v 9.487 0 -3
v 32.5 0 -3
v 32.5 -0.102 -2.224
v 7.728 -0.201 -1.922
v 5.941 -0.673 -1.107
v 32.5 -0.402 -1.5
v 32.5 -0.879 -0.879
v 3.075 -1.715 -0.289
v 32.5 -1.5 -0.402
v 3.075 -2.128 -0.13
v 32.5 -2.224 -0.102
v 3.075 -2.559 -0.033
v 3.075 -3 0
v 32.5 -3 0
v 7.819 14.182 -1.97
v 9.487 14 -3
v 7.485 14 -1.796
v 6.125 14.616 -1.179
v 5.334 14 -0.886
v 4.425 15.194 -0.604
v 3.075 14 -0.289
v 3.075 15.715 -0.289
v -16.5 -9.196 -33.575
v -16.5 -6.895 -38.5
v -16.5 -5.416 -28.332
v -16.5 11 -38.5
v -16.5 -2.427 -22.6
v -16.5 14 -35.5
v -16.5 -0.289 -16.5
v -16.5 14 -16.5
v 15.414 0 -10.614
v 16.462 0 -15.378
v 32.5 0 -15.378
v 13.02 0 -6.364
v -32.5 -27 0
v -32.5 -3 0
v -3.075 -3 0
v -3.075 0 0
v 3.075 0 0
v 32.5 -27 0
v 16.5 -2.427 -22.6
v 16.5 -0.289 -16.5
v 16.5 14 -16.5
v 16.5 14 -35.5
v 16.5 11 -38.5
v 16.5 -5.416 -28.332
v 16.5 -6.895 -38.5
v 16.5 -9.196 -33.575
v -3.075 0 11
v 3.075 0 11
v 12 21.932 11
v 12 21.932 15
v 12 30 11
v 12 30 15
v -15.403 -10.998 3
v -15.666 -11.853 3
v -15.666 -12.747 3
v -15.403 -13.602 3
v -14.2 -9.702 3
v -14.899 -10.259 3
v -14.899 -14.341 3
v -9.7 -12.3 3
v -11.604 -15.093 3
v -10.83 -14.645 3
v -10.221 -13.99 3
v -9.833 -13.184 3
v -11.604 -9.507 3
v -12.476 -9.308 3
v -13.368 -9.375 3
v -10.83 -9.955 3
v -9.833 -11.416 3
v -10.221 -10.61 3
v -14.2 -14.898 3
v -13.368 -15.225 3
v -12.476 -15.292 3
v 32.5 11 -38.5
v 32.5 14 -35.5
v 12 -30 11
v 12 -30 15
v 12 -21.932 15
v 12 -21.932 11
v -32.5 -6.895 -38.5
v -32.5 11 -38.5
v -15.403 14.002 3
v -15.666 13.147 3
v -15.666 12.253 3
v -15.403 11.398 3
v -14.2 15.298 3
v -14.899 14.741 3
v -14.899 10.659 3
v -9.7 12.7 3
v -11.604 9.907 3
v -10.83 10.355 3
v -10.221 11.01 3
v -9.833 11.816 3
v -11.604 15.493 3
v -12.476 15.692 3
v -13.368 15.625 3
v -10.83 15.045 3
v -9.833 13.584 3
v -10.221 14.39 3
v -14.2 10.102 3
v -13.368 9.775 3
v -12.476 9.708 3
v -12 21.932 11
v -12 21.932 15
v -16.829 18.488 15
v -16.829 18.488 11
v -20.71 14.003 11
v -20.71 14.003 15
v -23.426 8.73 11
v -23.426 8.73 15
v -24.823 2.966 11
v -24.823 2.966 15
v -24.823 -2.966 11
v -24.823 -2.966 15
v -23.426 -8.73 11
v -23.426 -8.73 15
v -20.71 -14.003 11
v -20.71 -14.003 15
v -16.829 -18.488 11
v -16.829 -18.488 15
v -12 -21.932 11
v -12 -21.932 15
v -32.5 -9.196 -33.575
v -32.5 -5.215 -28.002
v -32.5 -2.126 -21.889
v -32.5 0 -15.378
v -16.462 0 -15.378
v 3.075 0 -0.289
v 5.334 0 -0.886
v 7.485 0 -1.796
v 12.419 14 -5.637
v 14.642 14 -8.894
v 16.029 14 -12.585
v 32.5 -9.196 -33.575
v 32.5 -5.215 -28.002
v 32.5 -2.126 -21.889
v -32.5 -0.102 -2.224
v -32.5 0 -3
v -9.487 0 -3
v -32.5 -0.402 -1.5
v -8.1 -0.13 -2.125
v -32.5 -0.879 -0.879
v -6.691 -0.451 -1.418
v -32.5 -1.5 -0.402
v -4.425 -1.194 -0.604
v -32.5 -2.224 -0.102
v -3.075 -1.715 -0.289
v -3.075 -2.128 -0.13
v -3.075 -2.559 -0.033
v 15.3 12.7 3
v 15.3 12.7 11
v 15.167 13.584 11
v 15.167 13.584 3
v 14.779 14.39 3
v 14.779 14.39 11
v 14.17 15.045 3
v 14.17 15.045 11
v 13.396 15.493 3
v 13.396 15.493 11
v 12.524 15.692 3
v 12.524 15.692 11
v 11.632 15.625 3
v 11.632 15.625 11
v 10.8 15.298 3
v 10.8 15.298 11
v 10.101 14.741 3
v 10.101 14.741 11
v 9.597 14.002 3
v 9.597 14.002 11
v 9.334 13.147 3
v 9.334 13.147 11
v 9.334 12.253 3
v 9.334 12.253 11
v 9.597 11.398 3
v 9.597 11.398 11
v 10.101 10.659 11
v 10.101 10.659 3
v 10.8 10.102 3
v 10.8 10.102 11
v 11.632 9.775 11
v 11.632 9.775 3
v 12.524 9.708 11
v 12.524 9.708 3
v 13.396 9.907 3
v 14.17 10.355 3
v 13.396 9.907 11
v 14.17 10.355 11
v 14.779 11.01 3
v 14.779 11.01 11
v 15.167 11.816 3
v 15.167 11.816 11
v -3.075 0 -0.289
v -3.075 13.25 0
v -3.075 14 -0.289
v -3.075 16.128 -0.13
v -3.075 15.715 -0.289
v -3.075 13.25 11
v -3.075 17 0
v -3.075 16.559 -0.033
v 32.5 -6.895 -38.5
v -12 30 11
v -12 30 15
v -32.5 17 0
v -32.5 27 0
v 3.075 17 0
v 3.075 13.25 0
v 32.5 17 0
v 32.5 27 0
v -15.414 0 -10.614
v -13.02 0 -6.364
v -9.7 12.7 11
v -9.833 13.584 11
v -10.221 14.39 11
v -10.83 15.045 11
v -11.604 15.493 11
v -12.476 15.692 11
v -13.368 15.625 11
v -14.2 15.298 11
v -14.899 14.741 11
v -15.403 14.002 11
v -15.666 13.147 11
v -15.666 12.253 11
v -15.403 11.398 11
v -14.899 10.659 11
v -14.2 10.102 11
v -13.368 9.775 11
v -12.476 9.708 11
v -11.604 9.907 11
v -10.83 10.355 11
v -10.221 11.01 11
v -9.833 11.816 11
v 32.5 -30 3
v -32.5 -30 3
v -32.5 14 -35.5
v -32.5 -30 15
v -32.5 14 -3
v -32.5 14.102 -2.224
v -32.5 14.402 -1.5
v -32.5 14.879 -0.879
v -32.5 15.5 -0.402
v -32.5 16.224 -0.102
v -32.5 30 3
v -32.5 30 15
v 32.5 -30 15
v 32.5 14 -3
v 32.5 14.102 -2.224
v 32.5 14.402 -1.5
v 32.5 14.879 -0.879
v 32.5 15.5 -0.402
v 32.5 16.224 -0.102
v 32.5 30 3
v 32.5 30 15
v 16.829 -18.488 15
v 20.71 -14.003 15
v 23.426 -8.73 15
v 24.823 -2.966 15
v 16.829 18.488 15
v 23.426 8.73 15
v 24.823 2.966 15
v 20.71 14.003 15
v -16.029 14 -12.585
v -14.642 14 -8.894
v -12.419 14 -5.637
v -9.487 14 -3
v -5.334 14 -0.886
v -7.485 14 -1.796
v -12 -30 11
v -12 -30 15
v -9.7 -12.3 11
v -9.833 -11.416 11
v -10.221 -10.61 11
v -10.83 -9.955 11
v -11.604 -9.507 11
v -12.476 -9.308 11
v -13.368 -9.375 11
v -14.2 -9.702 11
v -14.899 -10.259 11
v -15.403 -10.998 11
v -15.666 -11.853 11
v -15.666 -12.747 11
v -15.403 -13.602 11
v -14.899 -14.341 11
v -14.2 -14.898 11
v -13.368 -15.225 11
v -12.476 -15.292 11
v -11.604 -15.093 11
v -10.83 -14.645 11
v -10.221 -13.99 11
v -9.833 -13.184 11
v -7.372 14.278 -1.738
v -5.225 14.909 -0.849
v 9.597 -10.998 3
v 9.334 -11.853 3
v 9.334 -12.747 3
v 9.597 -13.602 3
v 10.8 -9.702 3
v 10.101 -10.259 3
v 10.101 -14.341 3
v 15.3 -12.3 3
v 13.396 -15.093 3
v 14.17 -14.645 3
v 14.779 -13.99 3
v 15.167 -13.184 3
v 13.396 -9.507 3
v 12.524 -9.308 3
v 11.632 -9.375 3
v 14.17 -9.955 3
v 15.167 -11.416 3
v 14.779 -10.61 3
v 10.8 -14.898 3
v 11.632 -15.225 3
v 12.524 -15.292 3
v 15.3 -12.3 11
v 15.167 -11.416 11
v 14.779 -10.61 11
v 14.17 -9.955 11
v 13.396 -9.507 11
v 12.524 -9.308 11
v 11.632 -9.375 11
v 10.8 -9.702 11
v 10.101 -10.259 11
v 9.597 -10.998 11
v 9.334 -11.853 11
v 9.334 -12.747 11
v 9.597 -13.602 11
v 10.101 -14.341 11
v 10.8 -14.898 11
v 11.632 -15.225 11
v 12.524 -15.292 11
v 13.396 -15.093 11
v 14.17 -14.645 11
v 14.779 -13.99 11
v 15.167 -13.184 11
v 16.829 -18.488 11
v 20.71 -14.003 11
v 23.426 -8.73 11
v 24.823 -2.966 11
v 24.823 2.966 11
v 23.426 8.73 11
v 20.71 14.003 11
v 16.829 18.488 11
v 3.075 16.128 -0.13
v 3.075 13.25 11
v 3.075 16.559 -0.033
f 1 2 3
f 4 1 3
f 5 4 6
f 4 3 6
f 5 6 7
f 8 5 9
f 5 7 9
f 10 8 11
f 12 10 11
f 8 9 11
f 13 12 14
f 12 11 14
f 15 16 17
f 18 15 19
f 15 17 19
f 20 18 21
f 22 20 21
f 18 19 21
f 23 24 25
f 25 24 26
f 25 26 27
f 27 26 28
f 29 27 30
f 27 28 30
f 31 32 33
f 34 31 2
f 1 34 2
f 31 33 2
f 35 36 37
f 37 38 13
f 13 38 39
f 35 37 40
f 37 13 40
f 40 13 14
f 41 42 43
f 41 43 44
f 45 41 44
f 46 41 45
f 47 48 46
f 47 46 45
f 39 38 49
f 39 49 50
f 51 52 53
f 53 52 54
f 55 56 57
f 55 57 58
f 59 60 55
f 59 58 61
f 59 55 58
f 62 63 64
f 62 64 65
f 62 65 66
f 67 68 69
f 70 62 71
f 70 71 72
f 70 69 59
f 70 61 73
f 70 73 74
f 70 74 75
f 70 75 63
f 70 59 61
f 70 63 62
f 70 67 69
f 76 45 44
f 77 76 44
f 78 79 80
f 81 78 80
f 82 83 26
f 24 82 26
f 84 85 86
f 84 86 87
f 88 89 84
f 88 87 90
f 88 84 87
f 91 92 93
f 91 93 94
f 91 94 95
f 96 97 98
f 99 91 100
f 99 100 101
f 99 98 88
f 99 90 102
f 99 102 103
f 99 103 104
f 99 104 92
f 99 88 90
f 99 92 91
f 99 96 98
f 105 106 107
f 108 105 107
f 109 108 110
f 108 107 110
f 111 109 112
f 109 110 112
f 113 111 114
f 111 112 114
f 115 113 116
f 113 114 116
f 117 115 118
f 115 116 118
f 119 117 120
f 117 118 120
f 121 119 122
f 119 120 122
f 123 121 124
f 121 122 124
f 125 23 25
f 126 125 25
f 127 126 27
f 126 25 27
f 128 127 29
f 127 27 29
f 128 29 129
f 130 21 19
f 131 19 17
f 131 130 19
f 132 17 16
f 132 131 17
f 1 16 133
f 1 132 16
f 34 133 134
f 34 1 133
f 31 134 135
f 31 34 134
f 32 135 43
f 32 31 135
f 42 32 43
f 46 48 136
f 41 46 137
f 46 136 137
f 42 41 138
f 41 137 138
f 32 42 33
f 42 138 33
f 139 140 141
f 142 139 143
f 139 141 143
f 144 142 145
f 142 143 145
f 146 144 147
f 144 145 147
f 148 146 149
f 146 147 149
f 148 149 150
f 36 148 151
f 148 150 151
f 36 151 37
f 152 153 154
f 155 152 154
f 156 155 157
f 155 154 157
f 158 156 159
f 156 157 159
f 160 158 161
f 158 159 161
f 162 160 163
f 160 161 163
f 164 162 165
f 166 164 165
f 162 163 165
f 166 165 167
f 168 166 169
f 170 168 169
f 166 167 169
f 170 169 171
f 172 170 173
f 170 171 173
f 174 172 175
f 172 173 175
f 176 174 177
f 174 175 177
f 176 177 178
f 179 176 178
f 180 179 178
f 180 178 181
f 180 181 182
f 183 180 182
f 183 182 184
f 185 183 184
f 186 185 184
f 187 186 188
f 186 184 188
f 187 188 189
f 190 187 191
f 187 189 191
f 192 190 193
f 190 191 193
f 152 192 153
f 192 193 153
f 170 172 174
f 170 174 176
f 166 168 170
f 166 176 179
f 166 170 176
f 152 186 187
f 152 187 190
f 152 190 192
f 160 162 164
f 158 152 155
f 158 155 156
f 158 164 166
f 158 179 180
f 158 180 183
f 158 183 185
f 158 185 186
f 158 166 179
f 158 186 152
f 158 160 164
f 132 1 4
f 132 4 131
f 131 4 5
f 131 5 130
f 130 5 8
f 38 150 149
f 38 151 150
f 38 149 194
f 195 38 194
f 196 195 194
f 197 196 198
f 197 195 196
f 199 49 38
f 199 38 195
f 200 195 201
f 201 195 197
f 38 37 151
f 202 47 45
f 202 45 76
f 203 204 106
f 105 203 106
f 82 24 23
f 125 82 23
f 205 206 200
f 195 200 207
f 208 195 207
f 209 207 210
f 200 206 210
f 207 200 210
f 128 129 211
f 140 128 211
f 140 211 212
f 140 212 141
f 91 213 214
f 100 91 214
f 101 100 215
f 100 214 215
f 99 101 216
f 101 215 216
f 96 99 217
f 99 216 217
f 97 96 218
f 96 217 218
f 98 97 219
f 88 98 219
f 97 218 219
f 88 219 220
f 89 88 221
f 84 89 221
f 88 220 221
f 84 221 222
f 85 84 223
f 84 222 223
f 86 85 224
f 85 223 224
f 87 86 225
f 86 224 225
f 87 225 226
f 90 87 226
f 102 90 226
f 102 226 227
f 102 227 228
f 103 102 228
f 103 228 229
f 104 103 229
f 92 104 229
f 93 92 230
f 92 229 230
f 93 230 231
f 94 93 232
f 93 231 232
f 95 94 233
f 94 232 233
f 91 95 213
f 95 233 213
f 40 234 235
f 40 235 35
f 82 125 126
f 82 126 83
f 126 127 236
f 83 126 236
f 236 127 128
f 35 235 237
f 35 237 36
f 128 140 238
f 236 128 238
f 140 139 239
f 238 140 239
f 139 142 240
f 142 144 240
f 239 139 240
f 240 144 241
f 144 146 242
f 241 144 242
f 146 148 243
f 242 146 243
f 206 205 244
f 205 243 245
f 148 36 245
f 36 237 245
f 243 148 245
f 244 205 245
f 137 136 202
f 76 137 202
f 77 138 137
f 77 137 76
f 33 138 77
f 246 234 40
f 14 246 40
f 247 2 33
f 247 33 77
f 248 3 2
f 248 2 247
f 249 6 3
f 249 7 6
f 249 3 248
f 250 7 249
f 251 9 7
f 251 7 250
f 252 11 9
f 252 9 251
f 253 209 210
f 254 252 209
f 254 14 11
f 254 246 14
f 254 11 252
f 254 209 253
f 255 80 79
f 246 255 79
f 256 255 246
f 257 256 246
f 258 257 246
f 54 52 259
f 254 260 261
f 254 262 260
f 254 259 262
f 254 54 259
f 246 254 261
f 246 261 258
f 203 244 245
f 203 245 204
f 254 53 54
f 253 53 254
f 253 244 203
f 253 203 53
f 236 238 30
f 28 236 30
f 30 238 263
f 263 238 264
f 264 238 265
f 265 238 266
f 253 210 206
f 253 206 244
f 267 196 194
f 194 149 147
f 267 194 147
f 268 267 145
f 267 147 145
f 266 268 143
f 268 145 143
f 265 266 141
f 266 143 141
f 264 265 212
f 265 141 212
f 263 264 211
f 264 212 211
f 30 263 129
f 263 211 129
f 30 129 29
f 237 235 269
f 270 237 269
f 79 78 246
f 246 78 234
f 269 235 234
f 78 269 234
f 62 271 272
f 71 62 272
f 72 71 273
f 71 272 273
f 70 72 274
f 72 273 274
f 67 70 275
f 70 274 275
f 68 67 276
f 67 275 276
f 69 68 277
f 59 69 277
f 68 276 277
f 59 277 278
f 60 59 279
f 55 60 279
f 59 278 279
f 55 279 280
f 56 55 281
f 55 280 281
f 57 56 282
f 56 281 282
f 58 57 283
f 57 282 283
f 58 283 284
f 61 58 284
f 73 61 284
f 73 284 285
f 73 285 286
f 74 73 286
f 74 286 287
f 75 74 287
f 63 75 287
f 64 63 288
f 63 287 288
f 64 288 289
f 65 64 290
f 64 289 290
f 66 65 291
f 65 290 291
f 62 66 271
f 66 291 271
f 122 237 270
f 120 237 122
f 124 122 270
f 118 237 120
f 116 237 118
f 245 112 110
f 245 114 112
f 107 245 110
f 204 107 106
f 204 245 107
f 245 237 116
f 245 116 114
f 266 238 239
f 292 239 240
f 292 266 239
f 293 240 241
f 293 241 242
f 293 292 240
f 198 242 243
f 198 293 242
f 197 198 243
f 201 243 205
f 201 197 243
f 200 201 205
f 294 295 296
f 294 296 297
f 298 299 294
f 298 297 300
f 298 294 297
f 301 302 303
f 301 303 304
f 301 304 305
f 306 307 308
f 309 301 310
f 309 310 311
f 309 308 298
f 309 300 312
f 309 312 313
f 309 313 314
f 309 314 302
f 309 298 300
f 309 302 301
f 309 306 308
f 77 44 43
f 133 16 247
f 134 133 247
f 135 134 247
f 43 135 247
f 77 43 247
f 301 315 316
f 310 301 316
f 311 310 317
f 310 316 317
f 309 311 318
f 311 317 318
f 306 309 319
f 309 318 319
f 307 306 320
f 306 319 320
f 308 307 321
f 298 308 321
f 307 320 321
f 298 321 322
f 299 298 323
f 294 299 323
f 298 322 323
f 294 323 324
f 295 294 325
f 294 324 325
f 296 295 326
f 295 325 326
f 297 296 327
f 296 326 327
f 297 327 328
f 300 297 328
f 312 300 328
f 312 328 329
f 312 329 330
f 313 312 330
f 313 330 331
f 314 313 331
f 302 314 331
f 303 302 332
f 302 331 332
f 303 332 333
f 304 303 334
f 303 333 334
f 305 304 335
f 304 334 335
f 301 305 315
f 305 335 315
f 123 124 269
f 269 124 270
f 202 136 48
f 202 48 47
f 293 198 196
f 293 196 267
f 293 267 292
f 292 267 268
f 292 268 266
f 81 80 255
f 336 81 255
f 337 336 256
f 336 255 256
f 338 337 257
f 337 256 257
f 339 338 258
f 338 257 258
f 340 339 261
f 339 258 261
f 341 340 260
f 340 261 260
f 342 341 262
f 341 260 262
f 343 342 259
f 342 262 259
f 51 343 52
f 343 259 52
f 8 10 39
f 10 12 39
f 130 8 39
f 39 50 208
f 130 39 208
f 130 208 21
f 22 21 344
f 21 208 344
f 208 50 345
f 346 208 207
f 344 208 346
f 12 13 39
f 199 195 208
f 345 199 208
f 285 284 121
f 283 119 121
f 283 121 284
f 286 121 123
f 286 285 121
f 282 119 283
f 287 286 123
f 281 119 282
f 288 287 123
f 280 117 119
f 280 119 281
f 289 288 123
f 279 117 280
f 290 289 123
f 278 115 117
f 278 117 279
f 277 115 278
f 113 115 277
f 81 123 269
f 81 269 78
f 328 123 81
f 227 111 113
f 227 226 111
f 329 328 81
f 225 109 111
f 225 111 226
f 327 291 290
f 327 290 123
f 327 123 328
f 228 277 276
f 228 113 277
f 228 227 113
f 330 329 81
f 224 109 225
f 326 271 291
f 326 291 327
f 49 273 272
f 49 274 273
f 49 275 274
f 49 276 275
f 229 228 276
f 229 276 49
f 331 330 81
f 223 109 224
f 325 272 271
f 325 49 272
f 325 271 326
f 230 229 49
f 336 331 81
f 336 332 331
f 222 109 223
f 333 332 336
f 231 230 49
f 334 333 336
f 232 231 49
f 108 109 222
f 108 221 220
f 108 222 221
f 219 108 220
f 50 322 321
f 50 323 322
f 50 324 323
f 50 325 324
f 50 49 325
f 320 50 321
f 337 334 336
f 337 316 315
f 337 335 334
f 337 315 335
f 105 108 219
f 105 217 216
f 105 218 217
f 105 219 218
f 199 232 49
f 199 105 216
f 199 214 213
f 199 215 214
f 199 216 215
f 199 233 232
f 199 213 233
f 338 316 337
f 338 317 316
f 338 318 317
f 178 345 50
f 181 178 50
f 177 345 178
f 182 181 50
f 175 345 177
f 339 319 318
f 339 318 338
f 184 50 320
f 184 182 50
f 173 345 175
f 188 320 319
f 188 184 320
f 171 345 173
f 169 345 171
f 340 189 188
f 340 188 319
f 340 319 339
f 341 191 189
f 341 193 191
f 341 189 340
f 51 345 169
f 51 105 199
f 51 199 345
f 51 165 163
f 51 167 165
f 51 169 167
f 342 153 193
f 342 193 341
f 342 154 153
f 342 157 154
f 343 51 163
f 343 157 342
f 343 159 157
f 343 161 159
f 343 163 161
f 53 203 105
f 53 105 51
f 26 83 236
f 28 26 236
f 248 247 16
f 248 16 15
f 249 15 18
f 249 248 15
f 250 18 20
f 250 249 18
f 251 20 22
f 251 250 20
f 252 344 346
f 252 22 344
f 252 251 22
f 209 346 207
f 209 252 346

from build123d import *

# Parameters (mm, degrees)
F0_W          = 65
F0_H          = 60
F0_W_2        = 6.15
F0_H_2        = 13.25
F1_DEPTH      = 15
F3_DEPTH      = 14
F5_DEPTH      = 4
F6_R          = 3
F7_DEPTH      = 8
F9_DEPTH      = 90
F10_T4_DEPTH  = 29.425
F10_S5_R      = 16.5
F10_T6_DEPTH  = 16
F10_T10_DEPTH = 44.425
F10_S11_R     = 16.5
F10_T12_DEPTH = 24
F10_T17_DEPTH = 44.425
F10_S18_R     = 16.5
F10_T19_DEPTH = 24
F10_T24_DEPTH = 29.425
F10_S25_R     = 16.5
F10_T26_DEPTH = 16
F10_T30_DEPTH = 44.425
F10_S31_R     = 16.5
F10_T32_DEPTH = 24
F10_T37_DEPTH = 29.425
F10_S38_R     = 16.5
F10_T39_DEPTH = 16
F10_T43_DEPTH = 29.425
F10_S44_R     = 16.5
F10_T45_DEPTH = 16
F10_T49_DEPTH = 44.425
F10_S50_R     = 16.5
F10_T51_DEPTH = 24
F11_T1_DEPTH  = 80.4300979278
F11_T3_DEPTH  = 51.7830754439
F11_T5_DEPTH  = 51.7830754439
F11_T7_DEPTH  = 31.4300979278
F11_T9_DEPTH  = 31.4300979278


# Not quite as in the source:
# - a fillet or chamfer that OpenCascade refuses, or shapes differently, is made with other operations: its cross-section is extruded or revolved along the edge and cut away or added


with BuildPart() as f1:
    # F0 (on Top) → F1 (new body)
    with BuildSketch(Plane.XY):
        Rectangle(F0_W, F0_H)
        with Locations((0, 6.625)):
            Rectangle(F0_W_2, F0_H_2, mode=Mode.SUBTRACT)
    extrude(amount=F1_DEPTH)

    # F2 (on Front) → F3 (join, symmetric)
    with BuildSketch(Plane.XZ):
        with BuildLine():
            Line((-3.075, 0), (-32.5, 0))
            Line((-32.5, 0), (-32.5, -38.5))
            Line((-32.5, -38.5), (-16.5, -38.5))
            Line((-16.5, -38.5), (-16.5, -16.5))
            ThreePointArc((-16.5, -16.5), (-12.7080191218, -5.9759204678), (-3.075, -0.2890661898))
            Line((-3.075, -0.2890661898), (-3.075, 0))
        make_face()
        with BuildLine():
            Line((3.075, 0), (3.075, -0.2890661898))
            ThreePointArc((3.075, -0.2890661898), (12.7080191218, -5.9759204678), (16.5, -16.5))
            Line((16.5, -16.5), (16.5, -38.5))
            Line((16.5, -38.5), (32.5, -38.5))
            Line((32.5, -38.5), (32.5, 0))
            Line((32.5, 0), (3.075, 0))
        make_face()
    extrude(amount=F3_DEPTH, both=True)

    # F4 (on face) → F5 (cut)
    with BuildSketch(Plane.XY.offset(15)):
        with BuildLine():
            ThreePointArc((12, -21.9317121995), (25, 0), (12, 21.9317121995))
            Line((12, 21.9317121995), (12, 35))
            Line((12, 35), (-12, 35))
            Line((-12, 35), (-12, 21.9317121995))
            ThreePointArc((-12, 21.9317121995), (-25, 0), (-12, -21.9317121995))
            Line((-12, -21.9317121995), (-12, -35))
            Line((-12, -35), (12, -35))
            Line((12, -35), (12, -21.9317121995))
        make_face()
    extrude(amount=-F5_DEPTH, mode=Mode.SUBTRACT)

    # F6 (on face) → F7 (cut)
    with BuildSketch(Plane.XY.offset(11)):
        with Locations((-12.7, 12.7)):
            Circle(F6_R)
        with Locations((12.3, 12.7)):
            Circle(F6_R)
        with Locations((12.3, -12.3)):
            Circle(F6_R)
        with Locations((-12.7, -12.3)):
            Circle(F6_R)
    extrude(amount=-F7_DEPTH, mode=Mode.SUBTRACT)

    # F8 (on face) → F9 (cut)
    with BuildSketch(Plane.YZ.offset(32.5)):
        with BuildLine():
            Line((0, -15.3778724497), (0, 0))
            Line((0, 0), (-14, 0))
            Line((-14, 0), (-14, -38.5))
            ThreePointArc((-14, -38.5), (-5.2228777507, -28.0149492966), (0, -15.3778724497))
        make_face()
    extrude(amount=-F9_DEPTH, mode=Mode.SUBTRACT)

    # F10: fillet of radius 3 on 4 edges, made by hand


with BuildPart() as f10_tool2:
    # F10_s3 → F10_t4 (new body)
    with BuildSketch(Plane.YZ.offset(32.5)):
        with BuildLine():
            ThreePointArc((0, -3), (-0.8786796564, -0.8786796564), (-3, 0))
            Line((-3, 0), (0, 0))
            Line((0, 0), (0, -3))
        make_face()
    extrude(amount=-F10_T4_DEPTH)

    # F10_s5 → F10_t6 (cut, symmetric)
    with BuildSketch(Plane.XZ.offset(1.5)):
        with Locations((0, -16.5)):
            Circle(F10_S5_R)
    extrude(amount=F10_T6_DEPTH, both=True, mode=Mode.SUBTRACT)


with BuildPart() as f1_1:
    add(f1.part)

    # F10_t1: union F10_tool2
    add(f10_tool2.part)


with BuildPart() as f10_tool8:
    # F10_s9 → F10_t10 (new body)
    with BuildSketch(Plane.YZ.offset(40)):
        with BuildLine():
            ThreePointArc((0, -3), (-0.8786796564, -0.8786796564), (-3, 0))
            Line((-3, 0), (0, 0))
            Line((0, 0), (0, -3))
        make_face()
    extrude(amount=-F10_T10_DEPTH)

    # F10_s11 → F10_t12 (cut, symmetric)
    with BuildSketch(Plane.XZ.offset(1.5)):
        with Locations((0, -16.5)):
            Circle(F10_S11_R)
    extrude(amount=F10_T12_DEPTH, both=True, mode=Mode.SUBTRACT)

    split(bisect_by=Plane.YZ.offset(-3.075), keep=Keep.BOTTOM)


with BuildPart() as f1_2:
    add(f1_1.part)

    # F10_t7: union F10_tool8
    add(f10_tool8.part)


with BuildPart() as f10_tool15:
    # F10_s16 → F10_t17 (new body)
    with BuildSketch(Plane.YZ.offset(4.425)):
        with BuildLine():
            ThreePointArc((0, -3), (-0.8786796564, -0.8786796564), (-3, 0))
            Line((-3, 0), (0, 0))
            Line((0, 0), (0, -3))
        make_face()
    extrude(amount=-F10_T17_DEPTH)

    # F10_s18 → F10_t19 (cut, symmetric)
    with BuildSketch(Plane.XZ.offset(1.5)):
        with Locations((0, -16.5)):
            Circle(F10_S18_R)
    extrude(amount=F10_T19_DEPTH, both=True, mode=Mode.SUBTRACT)

    split(bisect_by=Plane.YZ.offset(3.075), keep=Keep.TOP)


with BuildPart() as f1_3:
    add(f1_2.part)

    # F10_t14: union F10_tool15
    add(f10_tool15.part)


with BuildPart() as f10_tool22:
    # F10_s23 → F10_t24 (new body)
    with BuildSketch(Plane.YZ.offset(-3.075)):
        with BuildLine():
            ThreePointArc((0, -3), (-0.8786796564, -0.8786796564), (-3, 0))
            Line((-3, 0), (0, 0))
            Line((0, 0), (0, -3))
        make_face()
    extrude(amount=-F10_T24_DEPTH)

    # F10_s25 → F10_t26 (cut, symmetric)
    with BuildSketch(Plane.XZ.offset(1.5)):
        with Locations((0, -16.5)):
            Circle(F10_S25_R)
    extrude(amount=F10_T26_DEPTH, both=True, mode=Mode.SUBTRACT)


with BuildPart() as f1_4:
    add(f1_3.part)

    # F10_t21: union F10_tool22
    add(f10_tool22.part)


with BuildPart() as f10_tool28:
    # F10_s29 → F10_t30 (new body)
    with BuildSketch(Plane.YZ.offset(4.425)):
        with BuildLine():
            ThreePointArc((14, -3), (14.8786796564, -0.8786796564), (17, 0))
            Line((17, 0), (14, 0))
            Line((14, 0), (14, -3))
        make_face()
    extrude(amount=-F10_T30_DEPTH)

    # F10_s31 → F10_t32 (cut, symmetric)
    with BuildSketch(Plane.XZ.offset(-15.5)):
        with Locations((0, -16.5)):
            Circle(F10_S31_R)
    extrude(amount=F10_T32_DEPTH, both=True, mode=Mode.SUBTRACT)

    split(bisect_by=Plane.YZ.offset(3.075), keep=Keep.TOP)


with BuildPart() as f1_5:
    add(f1_4.part)

    # F10_t27: union F10_tool28
    add(f10_tool28.part)


with BuildPart() as f10_tool35:
    # F10_s36 → F10_t37 (new body)
    with BuildSketch(Plane.YZ.offset(-3.075)):
        with BuildLine():
            ThreePointArc((14, -3), (14.8786796564, -0.8786796564), (17, 0))
            Line((17, 0), (14, 0))
            Line((14, 0), (14, -3))
        make_face()
    extrude(amount=-F10_T37_DEPTH)

    # F10_s38 → F10_t39 (cut, symmetric)
    with BuildSketch(Plane.XZ.offset(-15.5)):
        with Locations((0, -16.5)):
            Circle(F10_S38_R)
    extrude(amount=F10_T39_DEPTH, both=True, mode=Mode.SUBTRACT)


with BuildPart() as f1_6:
    add(f1_5.part)

    # F10_t34: union F10_tool35
    add(f10_tool35.part)


with BuildPart() as f10_tool41:
    # F10_s42 → F10_t43 (new body)
    with BuildSketch(Plane.YZ.offset(32.5)):
        with BuildLine():
            ThreePointArc((14, -3), (14.8786796564, -0.8786796564), (17, 0))
            Line((17, 0), (14, 0))
            Line((14, 0), (14, -3))
        make_face()
    extrude(amount=-F10_T43_DEPTH)

    # F10_s44 → F10_t45 (cut, symmetric)
    with BuildSketch(Plane.XZ.offset(-15.5)):
        with Locations((0, -16.5)):
            Circle(F10_S44_R)
    extrude(amount=F10_T45_DEPTH, both=True, mode=Mode.SUBTRACT)


with BuildPart() as f1_7:
    add(f1_6.part)

    # F10_t40: union F10_tool41
    add(f10_tool41.part)


with BuildPart() as f10_tool47:
    # F10_s48 → F10_t49 (new body)
    with BuildSketch(Plane.YZ.offset(40)):
        with BuildLine():
            ThreePointArc((14, -3), (14.8786796564, -0.8786796564), (17, 0))
            Line((17, 0), (14, 0))
            Line((14, 0), (14, -3))
        make_face()
    extrude(amount=-F10_T49_DEPTH)

    # F10_s50 → F10_t51 (cut, symmetric)
    with BuildSketch(Plane.XZ.offset(-15.5)):
        with Locations((0, -16.5)):
            Circle(F10_S50_R)
    extrude(amount=F10_T51_DEPTH, both=True, mode=Mode.SUBTRACT)

    split(bisect_by=Plane.YZ.offset(-3.075), keep=Keep.BOTTOM)


with BuildPart() as f1_8:
    add(f1_7.part)

    # F10_t46: union F10_tool47
    add(f10_tool47.part)

    # F11: chamfer of 3 on 6 edges, made by hand

    # F11_s2 → F11_t1 (cut)
    with BuildSketch(Plane.YZ.offset(-40.2150489639)):
        Polygon((-30, 3), (-27, 0), (-30, 0), align=None)
        Polygon((27, 0), (30, 3), (30, 0), align=None)
    extrude(amount=F11_T1_DEPTH, mode=Mode.SUBTRACT)

    # F11_s4 → F11_t3 (cut)
    with BuildSketch(Plane.YZ.offset(-50.391537722)):
        with BuildLine():
            Line((-6.8950157601, -38.5), (-9.1963693219, -33.5754814152))
            ThreePointArc((-9.1963693219, -33.5754814152), (-11.4890994339, -36.1144458386), (-14, -38.5))
            Line((-14, -38.5), (-6.8950157601, -38.5))
        make_face()
    extrude(amount=F11_T3_DEPTH, mode=Mode.SUBTRACT)

    # F11_s6 → F11_t5 (cut)
    with BuildSketch(Plane.YZ.offset(-1.391537722)):
        with BuildLine():
            Line((-9.1963693219, -33.5754814152), (-6.8950157601, -38.5))
            Line((-6.8950157601, -38.5), (-14, -38.5))
            ThreePointArc((-14, -38.5), (-11.4890994339, -36.1144458386), (-9.1963693219, -33.5754814152))
        make_face()
    extrude(amount=F11_T5_DEPTH, mode=Mode.SUBTRACT)

    # F11_s8 → F11_t7 (cut)
    with BuildSketch(Plane.YZ.offset(8.7849510361)):
        Polygon((11, -38.5), (14, -35.5), (14, -38.5), align=None)
    extrude(amount=F11_T7_DEPTH, mode=Mode.SUBTRACT)

    # F11_s10 → F11_t9 (cut)
    with BuildSketch(Plane.YZ.offset(-40.2150489639)):
        Polygon((11, -38.5), (14, -35.5), (14, -38.5), align=None)
    extrude(amount=F11_T9_DEPTH, mode=Mode.SUBTRACT)


solid = f1_8.part
